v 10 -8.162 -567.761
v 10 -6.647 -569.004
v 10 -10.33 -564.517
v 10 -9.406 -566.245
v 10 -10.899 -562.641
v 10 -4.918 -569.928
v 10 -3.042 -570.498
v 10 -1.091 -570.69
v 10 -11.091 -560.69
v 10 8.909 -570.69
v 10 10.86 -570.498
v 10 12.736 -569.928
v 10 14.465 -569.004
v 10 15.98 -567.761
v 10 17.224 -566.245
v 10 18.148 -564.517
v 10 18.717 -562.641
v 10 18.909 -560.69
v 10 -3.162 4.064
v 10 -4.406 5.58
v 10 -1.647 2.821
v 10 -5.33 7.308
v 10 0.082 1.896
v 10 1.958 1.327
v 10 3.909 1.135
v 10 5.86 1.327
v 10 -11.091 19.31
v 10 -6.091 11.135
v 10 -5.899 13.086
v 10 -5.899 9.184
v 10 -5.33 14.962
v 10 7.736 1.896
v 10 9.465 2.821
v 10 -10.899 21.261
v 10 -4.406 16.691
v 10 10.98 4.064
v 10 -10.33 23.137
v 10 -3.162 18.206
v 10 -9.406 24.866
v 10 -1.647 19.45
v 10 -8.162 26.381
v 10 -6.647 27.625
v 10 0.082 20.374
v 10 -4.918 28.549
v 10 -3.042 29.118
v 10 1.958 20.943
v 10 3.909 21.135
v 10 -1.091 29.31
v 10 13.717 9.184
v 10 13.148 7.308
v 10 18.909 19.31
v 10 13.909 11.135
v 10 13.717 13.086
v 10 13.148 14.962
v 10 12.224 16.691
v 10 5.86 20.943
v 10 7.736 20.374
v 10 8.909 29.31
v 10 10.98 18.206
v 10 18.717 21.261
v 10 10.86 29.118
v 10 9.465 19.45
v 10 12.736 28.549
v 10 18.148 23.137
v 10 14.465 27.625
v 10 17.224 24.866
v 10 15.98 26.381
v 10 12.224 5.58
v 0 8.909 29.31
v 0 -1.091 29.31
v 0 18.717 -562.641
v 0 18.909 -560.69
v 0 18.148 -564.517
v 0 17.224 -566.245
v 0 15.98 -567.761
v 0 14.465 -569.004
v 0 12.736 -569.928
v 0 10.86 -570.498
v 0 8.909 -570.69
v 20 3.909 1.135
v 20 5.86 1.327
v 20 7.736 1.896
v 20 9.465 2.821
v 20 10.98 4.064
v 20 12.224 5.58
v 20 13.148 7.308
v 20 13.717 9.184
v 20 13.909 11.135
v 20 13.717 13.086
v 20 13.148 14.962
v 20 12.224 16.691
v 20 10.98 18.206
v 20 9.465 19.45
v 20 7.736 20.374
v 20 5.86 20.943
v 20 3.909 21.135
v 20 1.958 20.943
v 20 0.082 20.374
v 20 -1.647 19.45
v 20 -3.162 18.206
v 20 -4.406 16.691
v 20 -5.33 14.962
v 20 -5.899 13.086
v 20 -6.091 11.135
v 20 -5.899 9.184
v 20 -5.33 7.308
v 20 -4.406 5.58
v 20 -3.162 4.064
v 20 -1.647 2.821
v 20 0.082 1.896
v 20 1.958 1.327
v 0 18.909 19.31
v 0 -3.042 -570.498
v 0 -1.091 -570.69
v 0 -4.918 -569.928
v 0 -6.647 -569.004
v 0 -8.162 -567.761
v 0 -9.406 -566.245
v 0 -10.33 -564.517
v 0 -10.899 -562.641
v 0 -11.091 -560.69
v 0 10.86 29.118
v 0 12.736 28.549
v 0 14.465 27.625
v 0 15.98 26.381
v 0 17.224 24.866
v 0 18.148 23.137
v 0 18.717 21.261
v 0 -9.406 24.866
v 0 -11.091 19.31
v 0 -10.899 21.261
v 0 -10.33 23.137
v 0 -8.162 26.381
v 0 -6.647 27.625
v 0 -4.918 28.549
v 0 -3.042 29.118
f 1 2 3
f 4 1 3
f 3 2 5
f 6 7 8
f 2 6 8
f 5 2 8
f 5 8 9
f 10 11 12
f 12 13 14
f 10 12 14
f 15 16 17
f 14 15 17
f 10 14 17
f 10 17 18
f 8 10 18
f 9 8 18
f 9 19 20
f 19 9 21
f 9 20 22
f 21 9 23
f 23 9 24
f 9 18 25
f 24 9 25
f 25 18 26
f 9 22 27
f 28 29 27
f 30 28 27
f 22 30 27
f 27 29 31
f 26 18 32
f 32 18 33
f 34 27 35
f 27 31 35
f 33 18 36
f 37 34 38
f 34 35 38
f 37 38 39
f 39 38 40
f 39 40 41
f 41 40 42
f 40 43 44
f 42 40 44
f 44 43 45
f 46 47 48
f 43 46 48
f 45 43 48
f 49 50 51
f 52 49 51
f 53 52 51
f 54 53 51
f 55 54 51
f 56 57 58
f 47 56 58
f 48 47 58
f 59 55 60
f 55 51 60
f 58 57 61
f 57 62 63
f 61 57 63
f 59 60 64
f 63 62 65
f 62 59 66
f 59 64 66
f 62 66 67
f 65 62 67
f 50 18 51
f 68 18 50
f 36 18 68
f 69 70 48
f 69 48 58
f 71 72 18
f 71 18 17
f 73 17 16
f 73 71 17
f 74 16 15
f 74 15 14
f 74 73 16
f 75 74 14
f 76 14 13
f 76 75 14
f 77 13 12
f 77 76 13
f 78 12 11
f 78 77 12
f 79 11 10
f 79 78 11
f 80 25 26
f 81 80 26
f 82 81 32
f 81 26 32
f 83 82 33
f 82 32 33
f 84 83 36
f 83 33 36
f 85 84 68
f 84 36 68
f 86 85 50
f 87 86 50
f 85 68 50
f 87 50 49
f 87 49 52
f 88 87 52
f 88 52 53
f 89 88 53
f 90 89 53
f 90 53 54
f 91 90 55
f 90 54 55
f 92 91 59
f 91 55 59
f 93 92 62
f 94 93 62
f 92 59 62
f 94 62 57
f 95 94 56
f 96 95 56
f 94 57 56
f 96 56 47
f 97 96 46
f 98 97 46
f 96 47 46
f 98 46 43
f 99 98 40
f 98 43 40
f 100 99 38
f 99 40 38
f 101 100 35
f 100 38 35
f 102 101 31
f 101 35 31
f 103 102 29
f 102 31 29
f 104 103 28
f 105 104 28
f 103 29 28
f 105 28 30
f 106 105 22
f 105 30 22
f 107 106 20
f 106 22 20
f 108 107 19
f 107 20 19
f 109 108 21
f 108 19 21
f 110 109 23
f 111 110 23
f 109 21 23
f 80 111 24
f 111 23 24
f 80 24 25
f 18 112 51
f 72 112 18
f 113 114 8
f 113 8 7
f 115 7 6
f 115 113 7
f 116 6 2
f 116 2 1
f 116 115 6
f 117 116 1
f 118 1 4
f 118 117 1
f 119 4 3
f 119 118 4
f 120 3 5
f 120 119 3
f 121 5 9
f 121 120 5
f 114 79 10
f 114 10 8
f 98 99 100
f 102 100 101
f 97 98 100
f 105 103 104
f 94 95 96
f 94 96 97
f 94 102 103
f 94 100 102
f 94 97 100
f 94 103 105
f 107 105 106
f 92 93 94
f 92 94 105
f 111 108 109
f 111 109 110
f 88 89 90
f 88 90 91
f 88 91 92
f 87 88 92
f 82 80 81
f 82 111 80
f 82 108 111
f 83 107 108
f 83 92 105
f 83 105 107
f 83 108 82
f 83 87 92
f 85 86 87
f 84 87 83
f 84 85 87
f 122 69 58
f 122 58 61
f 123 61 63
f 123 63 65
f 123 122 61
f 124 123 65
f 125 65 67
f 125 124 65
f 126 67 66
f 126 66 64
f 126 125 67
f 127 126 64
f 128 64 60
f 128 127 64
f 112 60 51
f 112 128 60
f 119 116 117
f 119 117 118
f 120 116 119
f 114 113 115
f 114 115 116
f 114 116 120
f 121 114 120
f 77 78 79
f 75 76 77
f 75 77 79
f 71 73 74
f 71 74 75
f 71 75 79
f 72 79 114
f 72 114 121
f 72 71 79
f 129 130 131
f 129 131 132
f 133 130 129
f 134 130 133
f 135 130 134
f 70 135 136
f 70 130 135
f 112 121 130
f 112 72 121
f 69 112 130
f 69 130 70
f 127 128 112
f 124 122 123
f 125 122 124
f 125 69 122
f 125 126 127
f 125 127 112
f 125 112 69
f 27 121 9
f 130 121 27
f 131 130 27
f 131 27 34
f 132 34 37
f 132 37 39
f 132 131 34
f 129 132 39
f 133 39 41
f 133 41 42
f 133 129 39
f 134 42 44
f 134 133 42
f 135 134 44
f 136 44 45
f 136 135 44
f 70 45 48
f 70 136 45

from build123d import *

# Parameters (mm, degrees)
BOSS_EXTRUDE1_DEPTH = 10
SKETCH2_R           = 10
BOSS_EXTRUDE2_DEPTH = 10


with BuildPart() as part:
    # Sketch1 → Boss-Extrude1 (new body)
    with BuildSketch(Plane(origin=(0, 0, 0), x_dir=(0, 0, -1), z_dir=(1, 0, 0))):
        with BuildLine():
            Line((-19.310323675, 18.90886515), (560.689676325, 18.90886515))
            ThreePointArc((560.689676325, 18.90886515), (567.760744137, 15.979932962), (570.689676325, 8.90886515))
            Line((570.689676325, 8.90886515), (570.689676325, -1.09113485))
            ThreePointArc((570.689676325, -1.09113485), (567.760744137, -8.162202662), (560.689676325, -11.09113485))
            Line((560.689676325, -11.09113485), (-19.310323675, -11.09113485))
            ThreePointArc((-19.310323675, -11.09113485), (-26.381391487, -8.162202662), (-29.310323675, -1.09113485))
            Line((-29.310323675, -1.09113485), (-29.310323675, 8.90886515))
            ThreePointArc((-29.310323675, 8.90886515), (-26.381391487, 15.979932962), (-19.310323675, 18.90886515))
        make_face()
    extrude(amount=BOSS_EXTRUDE1_DEPTH)

    # Sketch2 → Boss-Extrude2 (add)
    with BuildSketch(Plane(origin=(10, 0, 0), x_dir=(0, 0, -1), z_dir=(1, 0, 0))):
        with Locations((-11.135288293, 3.90886515)):
            Circle(SKETCH2_R)
    extrude(amount=BOSS_EXTRUDE2_DEPTH)


solid = part.part
